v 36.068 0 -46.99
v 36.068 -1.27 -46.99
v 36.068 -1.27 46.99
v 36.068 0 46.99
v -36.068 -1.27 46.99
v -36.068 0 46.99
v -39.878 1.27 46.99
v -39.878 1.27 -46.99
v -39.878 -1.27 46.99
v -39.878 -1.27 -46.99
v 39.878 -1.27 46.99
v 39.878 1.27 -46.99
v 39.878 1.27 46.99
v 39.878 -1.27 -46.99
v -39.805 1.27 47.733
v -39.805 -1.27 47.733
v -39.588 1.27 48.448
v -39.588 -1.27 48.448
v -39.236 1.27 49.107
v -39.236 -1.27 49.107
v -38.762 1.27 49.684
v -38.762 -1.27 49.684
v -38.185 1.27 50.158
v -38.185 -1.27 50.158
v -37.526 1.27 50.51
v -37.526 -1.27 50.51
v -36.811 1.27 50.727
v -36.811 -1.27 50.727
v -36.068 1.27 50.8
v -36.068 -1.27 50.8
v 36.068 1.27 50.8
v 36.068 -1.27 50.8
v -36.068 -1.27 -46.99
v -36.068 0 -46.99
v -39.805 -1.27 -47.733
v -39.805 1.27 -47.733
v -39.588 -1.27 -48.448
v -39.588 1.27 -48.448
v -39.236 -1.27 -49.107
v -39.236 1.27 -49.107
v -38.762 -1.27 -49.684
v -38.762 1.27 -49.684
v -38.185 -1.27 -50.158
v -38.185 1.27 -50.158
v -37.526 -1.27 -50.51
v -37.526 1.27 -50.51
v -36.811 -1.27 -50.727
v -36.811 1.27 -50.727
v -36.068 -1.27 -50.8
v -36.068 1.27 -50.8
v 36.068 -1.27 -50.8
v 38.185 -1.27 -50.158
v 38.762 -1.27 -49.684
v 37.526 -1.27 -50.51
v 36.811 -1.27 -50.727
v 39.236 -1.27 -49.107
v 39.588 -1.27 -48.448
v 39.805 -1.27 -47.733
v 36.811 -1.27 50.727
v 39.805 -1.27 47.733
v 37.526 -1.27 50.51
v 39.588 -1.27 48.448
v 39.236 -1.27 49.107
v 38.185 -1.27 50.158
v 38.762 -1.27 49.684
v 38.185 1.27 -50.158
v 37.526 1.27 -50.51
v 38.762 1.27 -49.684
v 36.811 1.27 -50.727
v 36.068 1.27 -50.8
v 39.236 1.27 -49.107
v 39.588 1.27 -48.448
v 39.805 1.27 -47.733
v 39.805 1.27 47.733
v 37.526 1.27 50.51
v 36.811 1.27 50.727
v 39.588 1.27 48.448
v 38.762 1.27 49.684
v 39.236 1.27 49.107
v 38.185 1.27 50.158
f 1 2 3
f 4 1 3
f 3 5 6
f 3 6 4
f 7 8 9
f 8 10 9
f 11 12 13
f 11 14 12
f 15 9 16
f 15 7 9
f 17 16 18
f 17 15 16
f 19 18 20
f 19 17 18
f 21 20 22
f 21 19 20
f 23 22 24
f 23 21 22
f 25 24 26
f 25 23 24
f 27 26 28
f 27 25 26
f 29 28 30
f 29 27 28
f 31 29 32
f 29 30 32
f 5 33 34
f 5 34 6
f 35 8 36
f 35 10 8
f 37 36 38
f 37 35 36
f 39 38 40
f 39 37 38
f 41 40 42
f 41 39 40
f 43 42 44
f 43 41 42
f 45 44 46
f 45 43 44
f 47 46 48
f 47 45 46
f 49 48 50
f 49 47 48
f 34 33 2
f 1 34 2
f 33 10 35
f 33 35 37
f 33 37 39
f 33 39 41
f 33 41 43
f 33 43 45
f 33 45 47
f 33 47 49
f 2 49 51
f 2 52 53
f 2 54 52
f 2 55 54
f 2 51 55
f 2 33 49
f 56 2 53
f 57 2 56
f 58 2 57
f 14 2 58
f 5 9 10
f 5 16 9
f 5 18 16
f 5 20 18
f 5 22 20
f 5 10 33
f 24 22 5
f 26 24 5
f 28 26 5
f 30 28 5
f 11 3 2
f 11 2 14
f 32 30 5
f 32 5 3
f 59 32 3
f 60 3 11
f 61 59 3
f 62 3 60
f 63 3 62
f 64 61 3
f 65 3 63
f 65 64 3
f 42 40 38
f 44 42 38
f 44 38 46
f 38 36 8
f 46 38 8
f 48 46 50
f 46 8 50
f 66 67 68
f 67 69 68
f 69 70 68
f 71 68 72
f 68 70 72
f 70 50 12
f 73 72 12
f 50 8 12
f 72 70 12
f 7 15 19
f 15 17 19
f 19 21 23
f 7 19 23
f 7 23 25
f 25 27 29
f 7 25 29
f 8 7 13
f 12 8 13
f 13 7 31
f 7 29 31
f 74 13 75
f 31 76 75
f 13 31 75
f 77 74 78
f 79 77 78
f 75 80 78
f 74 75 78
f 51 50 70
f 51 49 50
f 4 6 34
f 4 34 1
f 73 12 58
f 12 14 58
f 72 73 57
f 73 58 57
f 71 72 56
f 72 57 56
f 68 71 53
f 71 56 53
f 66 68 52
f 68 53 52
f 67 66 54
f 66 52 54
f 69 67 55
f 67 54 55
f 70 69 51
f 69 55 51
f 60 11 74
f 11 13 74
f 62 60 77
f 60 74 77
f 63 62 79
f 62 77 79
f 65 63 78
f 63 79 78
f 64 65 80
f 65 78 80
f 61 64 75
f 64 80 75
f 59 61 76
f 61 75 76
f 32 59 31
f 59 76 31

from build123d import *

# Parameters (mm, degrees)
F0_W     = 79.756
F0_H     = 101.6
F1_DEPTH = 1.27
F2_R     = 3.81
F3_W     = 72.136
F3_H     = 93.98
F4_DEPTH = 1.27


with BuildPart() as f1:
    # F0 (on Front) → F1 (new body, symmetric)
    with BuildSketch(Plane.XZ):
        Rectangle(F0_W, F0_H)
    extrude(amount=F1_DEPTH, both=True)

    # F2
    f2_edges = [f1.edges().sort_by_distance(p)[0] for p in [
        (-39.878, 0, 50.8),
        (39.878, 0, 50.8),
        (39.878, 0, -50.8),
        (-39.878, 0, -50.8),
    ]]
    fillet(f2_edges, radius=F2_R)

    # F3 (on face) → F4 (cut)
    with BuildSketch(Plane.XZ.offset(1.27)):
        Rectangle(F3_W, F3_H)
    extrude(amount=-F4_DEPTH, mode=Mode.SUBTRACT)


solid = f1.part
